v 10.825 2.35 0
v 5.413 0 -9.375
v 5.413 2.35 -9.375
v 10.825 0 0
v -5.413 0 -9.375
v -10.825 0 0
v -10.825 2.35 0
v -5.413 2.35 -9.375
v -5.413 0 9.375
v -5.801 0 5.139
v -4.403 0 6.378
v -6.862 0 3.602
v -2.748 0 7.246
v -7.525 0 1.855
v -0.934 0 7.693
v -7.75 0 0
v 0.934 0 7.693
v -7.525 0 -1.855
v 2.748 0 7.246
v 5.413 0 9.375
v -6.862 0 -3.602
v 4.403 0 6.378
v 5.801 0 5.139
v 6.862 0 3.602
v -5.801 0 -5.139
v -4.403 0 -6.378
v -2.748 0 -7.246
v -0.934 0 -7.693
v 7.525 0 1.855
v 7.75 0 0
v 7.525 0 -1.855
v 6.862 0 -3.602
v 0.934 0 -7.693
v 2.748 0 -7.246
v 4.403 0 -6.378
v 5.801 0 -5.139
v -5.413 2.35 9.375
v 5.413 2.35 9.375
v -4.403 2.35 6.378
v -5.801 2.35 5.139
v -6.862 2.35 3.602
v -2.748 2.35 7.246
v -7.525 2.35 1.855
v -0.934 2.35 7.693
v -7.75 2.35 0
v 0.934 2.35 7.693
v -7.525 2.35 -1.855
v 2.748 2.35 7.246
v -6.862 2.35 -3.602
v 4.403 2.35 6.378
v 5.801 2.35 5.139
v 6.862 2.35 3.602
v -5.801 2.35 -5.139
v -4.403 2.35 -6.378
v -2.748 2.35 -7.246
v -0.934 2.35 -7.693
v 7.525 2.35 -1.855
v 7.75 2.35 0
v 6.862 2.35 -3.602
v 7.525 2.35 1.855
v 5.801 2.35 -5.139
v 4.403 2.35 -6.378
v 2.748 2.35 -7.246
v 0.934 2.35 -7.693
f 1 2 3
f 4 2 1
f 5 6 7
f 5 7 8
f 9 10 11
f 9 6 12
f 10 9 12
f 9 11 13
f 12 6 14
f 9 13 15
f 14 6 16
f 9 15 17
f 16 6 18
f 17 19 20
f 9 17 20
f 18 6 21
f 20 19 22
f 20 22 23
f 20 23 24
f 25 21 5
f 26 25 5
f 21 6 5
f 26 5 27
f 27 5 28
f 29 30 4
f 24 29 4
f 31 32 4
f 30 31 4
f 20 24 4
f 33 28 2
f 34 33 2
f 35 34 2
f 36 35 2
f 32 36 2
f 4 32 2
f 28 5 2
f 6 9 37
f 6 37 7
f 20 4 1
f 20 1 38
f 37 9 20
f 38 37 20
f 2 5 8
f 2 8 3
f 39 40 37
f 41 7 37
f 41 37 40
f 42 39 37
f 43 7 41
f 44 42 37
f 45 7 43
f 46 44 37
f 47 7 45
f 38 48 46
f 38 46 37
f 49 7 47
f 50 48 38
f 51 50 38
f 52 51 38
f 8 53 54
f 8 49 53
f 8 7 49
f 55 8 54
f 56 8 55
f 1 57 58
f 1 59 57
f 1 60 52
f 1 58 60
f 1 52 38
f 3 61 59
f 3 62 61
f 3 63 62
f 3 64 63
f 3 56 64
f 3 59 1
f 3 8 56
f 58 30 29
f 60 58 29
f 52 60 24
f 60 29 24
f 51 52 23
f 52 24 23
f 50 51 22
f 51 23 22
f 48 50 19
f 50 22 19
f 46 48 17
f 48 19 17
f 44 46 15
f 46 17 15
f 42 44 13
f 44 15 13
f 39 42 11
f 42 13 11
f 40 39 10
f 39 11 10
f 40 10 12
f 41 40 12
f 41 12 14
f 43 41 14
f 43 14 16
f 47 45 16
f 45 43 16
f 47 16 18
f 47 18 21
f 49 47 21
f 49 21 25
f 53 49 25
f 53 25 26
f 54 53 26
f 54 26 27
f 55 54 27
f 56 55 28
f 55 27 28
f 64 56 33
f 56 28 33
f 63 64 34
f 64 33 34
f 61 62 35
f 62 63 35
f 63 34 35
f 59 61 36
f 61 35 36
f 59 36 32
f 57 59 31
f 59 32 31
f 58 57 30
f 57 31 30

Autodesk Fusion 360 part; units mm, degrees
sketch "Sketch1" plane through (0, 0, 0) normal (0, 1, 0) x (1, 0, 0)
  circle A0 centre (0, 0) radius 7.75
  line L0 (0, 0) -> (0, -11)
  line L1 (0, 0) -> (0, 11)
  line L2 (0, -9.375) -> (-5.4127, -9.375)
  line L3 (-5.4127, -9.375) -> (-10.8253, 0)
  line L4 (-10.8253, 0) -> (-5.4127, 9.375)
  line L5 (-5.4127, 9.375) -> (0, 9.375)
  line L6 (0, 9.375) -> (5.4127, 9.375)
  line L7 (5.4127, 9.375) -> (10.8253, 0)
  line L8 (10.8253, 0) -> (5.4127, -9.375)
  line L9 (0, -9.375) -> (5.4127, -9.375)
  dimension "d1" = 15.5
  dimension "d2" = 11
  dimension "d3" = 11
  dimension "d4" = 18.75
  dimension "d5" = 9.375
  dimension "d6" = 9.375
  dimension "d7" = 9.375
  dimension "d11" = 120
  dimension "d12" = 120
  dimension "d13" = 9.375
  dimension "d14" = 9.375
extrude "Extrude1" add sketch "Sketch1" along normal blind 2.35 contours A0 L0 L1 L6 L7 L8 L9 | A0 L0 L1 L2 L3 L4 L5
equation "d3 = d2"
equation "d5 = ( 18.75 / 2 ) * 1 mm"
equation "d6 = d5"
equation "d7 = d5"
equation "d12 = d11"
equation "d13 = d5"
equation "d14 = d5"
